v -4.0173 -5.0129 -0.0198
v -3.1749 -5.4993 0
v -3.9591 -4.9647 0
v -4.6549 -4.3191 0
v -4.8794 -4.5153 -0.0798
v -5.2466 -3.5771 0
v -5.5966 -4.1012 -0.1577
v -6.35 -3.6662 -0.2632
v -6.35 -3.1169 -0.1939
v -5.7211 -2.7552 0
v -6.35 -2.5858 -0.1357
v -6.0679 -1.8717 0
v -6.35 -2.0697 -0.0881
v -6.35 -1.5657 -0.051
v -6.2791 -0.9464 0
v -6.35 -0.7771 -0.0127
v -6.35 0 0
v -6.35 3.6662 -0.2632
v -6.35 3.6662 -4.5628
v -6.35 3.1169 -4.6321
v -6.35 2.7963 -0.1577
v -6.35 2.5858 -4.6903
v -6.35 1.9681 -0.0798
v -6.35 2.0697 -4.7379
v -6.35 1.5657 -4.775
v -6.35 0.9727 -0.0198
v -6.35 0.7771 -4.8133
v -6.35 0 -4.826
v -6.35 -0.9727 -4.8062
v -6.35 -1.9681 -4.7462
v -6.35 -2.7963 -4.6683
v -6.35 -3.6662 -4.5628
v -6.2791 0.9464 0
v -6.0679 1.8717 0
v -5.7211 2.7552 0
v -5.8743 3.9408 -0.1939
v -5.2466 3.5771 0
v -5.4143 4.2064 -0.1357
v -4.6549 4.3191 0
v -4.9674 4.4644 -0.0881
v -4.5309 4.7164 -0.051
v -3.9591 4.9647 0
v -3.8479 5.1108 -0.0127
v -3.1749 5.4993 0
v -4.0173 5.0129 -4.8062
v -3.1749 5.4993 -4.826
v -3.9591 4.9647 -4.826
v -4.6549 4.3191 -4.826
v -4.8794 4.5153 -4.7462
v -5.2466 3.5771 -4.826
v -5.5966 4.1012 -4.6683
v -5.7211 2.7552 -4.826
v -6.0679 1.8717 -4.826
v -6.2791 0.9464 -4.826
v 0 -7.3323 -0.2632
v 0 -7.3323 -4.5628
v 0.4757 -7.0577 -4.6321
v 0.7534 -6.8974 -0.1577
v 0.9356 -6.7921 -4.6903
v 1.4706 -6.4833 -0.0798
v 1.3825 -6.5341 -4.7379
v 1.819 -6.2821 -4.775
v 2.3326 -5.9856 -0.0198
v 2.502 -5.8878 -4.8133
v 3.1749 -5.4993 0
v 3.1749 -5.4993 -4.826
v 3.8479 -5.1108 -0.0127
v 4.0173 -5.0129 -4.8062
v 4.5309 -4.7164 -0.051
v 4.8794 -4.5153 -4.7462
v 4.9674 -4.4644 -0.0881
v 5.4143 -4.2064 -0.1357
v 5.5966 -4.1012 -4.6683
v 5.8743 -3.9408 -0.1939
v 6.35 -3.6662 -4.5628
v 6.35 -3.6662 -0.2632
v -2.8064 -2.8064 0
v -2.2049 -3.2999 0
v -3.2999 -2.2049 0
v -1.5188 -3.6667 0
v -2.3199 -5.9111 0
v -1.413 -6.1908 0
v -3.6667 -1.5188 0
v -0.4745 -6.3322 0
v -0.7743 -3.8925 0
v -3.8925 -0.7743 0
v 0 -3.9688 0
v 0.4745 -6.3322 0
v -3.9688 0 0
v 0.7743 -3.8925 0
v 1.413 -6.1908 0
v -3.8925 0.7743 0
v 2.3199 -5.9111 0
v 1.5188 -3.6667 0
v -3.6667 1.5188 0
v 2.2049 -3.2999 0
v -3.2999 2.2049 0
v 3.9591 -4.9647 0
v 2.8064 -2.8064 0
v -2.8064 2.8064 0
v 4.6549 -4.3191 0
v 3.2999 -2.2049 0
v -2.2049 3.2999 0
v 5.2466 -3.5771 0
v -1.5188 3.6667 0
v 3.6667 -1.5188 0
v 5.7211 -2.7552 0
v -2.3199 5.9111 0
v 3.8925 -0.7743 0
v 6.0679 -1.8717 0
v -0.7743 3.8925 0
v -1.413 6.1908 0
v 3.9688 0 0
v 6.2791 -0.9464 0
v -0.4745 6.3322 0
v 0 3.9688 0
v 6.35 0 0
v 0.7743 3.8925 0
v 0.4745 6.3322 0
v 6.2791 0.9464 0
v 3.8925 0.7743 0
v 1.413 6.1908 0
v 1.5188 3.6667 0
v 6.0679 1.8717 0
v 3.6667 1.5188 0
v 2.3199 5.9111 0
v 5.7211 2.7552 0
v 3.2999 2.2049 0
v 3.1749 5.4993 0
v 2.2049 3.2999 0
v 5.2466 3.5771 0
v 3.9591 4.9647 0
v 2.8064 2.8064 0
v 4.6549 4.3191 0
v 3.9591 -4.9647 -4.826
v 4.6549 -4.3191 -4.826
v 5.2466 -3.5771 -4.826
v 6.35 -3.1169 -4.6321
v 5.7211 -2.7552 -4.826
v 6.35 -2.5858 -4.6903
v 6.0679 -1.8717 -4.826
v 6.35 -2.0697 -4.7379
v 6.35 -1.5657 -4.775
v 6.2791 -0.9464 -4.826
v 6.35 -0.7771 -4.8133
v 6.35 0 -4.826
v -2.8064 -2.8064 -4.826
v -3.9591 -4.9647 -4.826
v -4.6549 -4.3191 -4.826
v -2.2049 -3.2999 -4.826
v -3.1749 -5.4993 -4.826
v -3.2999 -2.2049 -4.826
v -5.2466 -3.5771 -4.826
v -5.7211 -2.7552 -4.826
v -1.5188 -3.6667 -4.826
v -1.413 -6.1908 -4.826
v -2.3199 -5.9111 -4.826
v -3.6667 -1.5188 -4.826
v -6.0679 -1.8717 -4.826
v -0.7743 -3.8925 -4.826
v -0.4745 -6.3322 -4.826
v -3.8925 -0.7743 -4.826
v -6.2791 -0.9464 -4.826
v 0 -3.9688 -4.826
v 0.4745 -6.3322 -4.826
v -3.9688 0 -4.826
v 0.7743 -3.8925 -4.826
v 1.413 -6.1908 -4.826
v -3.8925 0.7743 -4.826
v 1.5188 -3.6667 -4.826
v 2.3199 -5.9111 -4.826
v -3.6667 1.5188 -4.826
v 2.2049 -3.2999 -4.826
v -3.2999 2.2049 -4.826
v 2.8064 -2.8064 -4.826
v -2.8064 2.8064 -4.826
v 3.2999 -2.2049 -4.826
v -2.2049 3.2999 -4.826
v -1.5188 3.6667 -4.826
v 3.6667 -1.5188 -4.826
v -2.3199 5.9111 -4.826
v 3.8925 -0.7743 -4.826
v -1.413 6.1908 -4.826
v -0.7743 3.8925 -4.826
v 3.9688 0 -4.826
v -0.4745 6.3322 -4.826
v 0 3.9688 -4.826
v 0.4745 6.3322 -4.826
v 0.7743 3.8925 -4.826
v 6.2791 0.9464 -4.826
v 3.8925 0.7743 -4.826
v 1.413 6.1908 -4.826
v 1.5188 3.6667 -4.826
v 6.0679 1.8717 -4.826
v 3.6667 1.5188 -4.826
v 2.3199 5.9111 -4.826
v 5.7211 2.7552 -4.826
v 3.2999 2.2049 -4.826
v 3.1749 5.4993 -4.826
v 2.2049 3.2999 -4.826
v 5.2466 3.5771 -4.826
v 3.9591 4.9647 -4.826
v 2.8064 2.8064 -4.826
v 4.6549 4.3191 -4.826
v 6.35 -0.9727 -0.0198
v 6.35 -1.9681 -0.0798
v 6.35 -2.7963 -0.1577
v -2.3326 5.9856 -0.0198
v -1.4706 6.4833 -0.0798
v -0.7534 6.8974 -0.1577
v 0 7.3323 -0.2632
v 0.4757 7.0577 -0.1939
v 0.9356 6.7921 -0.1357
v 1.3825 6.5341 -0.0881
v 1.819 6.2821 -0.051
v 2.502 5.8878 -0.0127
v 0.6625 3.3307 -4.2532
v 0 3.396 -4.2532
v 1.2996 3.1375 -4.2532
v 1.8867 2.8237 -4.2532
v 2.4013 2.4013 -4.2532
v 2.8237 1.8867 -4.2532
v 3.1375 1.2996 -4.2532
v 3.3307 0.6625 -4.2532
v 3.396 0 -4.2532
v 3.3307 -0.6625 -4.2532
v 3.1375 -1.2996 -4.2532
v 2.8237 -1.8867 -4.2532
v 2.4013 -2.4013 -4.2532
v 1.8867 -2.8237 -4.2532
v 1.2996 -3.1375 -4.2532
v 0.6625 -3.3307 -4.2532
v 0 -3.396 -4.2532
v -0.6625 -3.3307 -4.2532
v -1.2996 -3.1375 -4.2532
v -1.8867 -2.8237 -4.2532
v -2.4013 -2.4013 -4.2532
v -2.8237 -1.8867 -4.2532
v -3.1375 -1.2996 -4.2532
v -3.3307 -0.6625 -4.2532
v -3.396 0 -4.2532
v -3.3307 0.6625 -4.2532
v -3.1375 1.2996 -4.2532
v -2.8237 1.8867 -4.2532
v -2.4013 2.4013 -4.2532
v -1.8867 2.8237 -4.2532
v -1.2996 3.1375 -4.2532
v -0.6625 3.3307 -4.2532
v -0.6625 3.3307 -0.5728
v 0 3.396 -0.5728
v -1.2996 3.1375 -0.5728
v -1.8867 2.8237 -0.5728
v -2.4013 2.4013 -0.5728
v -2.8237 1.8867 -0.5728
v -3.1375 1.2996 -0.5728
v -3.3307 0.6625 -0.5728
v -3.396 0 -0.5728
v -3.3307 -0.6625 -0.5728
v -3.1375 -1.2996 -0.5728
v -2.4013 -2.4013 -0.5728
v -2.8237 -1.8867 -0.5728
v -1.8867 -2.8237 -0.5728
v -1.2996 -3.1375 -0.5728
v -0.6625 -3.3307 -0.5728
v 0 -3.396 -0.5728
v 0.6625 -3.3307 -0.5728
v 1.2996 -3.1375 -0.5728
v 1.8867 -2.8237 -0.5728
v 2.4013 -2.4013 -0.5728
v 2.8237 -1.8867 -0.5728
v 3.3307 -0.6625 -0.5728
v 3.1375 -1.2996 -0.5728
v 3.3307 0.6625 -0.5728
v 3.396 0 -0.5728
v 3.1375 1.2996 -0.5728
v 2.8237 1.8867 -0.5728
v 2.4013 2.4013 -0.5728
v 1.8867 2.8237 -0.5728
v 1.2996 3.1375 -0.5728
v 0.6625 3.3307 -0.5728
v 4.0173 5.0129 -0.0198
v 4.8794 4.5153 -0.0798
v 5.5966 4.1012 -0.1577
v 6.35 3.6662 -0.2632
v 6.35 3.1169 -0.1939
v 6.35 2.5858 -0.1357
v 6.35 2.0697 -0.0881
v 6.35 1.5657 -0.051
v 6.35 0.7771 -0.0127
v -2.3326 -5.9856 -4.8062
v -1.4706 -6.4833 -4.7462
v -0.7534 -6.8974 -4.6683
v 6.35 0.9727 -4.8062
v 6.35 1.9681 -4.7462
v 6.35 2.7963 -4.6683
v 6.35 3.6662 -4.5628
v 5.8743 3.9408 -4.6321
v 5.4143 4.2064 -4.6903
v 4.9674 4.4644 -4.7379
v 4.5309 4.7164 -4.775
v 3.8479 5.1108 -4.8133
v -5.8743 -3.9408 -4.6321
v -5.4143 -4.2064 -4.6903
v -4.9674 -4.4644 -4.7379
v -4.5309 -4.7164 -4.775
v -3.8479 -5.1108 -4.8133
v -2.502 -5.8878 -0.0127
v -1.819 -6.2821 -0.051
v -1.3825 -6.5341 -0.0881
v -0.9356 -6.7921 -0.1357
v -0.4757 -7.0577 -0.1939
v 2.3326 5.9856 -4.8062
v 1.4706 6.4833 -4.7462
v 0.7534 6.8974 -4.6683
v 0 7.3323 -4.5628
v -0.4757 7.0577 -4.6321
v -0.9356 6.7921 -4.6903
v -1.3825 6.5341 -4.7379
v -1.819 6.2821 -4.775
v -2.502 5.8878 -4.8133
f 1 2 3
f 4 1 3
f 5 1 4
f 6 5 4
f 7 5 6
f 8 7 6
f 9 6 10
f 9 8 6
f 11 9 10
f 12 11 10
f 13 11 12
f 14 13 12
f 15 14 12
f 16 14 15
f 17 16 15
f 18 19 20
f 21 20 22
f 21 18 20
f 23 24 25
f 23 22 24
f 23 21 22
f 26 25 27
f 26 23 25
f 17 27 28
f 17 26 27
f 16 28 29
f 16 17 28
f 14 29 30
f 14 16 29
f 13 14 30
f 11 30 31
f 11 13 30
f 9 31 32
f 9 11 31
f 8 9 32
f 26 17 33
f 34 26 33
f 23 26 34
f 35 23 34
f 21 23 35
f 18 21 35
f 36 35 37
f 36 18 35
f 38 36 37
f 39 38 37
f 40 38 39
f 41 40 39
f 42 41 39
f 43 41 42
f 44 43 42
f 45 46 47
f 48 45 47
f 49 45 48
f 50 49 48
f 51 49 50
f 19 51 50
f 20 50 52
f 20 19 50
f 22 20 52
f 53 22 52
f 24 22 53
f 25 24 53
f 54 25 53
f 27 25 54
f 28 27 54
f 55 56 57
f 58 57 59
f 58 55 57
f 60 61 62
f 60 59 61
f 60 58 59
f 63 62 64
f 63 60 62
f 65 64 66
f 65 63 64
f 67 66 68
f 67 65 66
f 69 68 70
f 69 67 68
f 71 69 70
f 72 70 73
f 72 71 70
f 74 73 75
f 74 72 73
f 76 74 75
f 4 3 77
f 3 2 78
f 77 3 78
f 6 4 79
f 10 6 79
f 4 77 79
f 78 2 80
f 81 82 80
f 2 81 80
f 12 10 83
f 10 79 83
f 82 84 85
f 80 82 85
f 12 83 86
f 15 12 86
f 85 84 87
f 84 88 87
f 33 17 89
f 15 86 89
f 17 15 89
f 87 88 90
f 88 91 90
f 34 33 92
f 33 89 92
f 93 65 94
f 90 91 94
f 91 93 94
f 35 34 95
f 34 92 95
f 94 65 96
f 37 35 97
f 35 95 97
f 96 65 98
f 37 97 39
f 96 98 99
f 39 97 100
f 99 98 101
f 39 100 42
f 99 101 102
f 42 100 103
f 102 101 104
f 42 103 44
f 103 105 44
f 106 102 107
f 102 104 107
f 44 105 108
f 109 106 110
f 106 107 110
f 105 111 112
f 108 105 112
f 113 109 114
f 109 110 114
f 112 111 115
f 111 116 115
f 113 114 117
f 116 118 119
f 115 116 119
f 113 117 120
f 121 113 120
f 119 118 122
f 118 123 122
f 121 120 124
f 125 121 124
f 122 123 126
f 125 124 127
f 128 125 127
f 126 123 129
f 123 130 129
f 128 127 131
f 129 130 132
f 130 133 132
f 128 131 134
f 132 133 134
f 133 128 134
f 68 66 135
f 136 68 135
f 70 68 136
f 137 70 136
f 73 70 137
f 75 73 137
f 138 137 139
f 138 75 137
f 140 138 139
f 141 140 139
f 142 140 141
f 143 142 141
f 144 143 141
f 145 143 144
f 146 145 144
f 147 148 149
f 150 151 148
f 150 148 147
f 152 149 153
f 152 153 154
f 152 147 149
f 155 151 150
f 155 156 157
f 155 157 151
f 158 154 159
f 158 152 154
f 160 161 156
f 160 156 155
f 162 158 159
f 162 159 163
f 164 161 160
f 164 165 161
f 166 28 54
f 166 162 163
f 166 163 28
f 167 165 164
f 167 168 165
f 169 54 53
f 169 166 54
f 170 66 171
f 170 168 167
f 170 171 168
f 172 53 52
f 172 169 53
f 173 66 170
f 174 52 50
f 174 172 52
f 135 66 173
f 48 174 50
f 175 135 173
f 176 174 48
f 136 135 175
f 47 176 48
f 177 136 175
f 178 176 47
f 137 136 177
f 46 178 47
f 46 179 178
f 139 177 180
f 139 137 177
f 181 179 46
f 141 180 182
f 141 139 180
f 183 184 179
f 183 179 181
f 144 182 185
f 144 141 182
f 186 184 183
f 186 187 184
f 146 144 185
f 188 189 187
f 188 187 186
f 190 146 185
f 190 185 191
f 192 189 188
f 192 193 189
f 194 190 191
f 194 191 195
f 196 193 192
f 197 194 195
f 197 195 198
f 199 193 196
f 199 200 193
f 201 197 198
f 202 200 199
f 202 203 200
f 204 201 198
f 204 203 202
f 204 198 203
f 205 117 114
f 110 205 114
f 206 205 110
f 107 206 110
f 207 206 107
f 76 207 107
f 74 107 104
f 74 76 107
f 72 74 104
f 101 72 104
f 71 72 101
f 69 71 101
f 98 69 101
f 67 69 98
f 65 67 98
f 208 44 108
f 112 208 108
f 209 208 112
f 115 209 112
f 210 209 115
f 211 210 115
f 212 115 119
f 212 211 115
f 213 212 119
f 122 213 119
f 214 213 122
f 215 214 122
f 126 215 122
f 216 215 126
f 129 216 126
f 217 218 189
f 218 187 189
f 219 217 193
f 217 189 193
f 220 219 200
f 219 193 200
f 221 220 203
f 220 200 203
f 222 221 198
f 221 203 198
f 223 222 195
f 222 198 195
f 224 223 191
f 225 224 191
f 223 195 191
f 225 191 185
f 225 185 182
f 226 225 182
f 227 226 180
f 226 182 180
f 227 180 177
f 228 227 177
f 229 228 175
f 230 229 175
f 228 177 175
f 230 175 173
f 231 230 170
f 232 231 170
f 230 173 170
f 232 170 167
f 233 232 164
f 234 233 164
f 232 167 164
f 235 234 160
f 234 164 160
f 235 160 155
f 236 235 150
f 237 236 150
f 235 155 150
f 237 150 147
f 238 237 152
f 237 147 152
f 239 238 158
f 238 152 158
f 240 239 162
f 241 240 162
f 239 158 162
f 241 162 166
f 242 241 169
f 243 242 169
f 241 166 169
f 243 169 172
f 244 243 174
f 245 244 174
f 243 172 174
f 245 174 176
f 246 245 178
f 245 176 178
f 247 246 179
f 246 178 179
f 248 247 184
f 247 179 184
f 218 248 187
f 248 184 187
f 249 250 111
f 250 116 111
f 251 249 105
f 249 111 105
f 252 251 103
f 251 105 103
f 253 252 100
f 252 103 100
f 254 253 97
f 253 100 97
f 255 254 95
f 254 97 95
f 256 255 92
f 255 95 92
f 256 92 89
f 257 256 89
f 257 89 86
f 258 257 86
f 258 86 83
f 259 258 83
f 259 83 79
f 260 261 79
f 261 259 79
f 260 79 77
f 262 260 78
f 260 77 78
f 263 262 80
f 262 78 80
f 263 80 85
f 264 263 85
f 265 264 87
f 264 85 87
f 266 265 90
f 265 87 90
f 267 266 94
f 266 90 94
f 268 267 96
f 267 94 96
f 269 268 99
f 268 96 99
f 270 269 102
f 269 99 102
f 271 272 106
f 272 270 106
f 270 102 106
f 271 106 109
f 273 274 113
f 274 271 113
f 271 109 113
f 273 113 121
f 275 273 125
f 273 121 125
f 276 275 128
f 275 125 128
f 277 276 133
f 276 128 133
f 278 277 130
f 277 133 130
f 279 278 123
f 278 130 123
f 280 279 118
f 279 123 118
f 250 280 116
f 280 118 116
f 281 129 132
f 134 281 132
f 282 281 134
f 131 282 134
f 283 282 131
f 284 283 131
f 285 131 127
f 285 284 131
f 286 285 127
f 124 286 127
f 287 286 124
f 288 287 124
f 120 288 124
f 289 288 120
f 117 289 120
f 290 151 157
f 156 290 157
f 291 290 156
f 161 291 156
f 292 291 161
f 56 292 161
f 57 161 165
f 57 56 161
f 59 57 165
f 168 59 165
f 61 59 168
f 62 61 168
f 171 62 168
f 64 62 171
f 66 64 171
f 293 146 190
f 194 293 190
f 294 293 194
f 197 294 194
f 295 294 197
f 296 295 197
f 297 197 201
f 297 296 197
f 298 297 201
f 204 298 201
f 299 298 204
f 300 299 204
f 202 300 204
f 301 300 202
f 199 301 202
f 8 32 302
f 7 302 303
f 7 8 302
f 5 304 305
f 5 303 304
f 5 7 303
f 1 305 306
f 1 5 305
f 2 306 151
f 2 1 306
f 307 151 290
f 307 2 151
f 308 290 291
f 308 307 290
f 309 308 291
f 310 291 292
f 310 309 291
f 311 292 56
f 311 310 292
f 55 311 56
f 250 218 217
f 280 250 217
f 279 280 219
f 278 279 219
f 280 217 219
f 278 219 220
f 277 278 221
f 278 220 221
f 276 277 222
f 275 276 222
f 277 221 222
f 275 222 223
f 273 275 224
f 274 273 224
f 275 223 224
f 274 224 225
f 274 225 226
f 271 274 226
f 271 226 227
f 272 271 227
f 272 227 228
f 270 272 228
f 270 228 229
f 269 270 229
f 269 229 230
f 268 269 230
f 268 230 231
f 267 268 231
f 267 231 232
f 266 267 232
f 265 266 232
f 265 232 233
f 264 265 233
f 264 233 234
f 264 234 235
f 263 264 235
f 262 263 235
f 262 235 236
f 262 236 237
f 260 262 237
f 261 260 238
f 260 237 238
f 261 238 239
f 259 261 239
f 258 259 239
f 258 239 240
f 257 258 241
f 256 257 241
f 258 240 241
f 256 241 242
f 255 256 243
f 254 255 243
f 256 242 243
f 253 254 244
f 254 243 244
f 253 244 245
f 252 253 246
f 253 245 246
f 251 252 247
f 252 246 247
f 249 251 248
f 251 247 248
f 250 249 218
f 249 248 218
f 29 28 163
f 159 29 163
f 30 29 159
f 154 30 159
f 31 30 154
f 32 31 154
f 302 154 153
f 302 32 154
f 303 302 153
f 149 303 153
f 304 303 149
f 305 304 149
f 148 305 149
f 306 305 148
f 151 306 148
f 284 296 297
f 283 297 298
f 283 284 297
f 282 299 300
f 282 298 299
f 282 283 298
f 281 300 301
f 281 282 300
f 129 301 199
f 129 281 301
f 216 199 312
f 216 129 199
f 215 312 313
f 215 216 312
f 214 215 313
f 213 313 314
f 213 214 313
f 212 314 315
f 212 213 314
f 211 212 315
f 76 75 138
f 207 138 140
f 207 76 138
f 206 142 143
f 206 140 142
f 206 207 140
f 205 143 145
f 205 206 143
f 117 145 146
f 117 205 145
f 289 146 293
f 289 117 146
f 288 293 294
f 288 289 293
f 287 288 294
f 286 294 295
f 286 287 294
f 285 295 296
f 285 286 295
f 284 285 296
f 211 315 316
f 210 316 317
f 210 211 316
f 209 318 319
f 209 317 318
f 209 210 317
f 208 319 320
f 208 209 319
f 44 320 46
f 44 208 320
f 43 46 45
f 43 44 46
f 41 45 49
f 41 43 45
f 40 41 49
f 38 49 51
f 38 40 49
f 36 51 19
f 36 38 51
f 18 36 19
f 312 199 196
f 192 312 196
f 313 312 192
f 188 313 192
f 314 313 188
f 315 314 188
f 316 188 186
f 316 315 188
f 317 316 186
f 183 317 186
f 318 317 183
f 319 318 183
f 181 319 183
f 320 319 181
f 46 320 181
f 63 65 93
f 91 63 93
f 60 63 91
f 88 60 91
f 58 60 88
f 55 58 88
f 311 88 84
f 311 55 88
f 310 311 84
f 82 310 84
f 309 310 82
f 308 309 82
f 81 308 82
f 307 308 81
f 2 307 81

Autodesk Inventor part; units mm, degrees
sketch "Sketch_8" plane through (0, 0, 0) normal (1, 0, 0) x (0, 1, 0)
  line L0 (0, -4.826) -> (0, 0)
  line L1 (0, 0) -> (6.35, 0)
  line L2 (6.35, 0) -> (7.62, -0.3403)
  line L3 (7.62, -0.3403) -> (7.62, -4.4857)
  line L4 (7.62, -4.4857) -> (6.35, -4.826)
  line L5 (6.35, -4.826) -> (0, -4.826)
  line L6 (0, -4.826) -> (0, 0)
sketch "Sketch_10" plane through (0, 0, 0) normal (0, 0, 1) x (1, 0, 0)
  line L0 (-12.7, -12.7) -> (12.7, -12.7)
  line L1 (12.7, -12.7) -> (12.7, 12.7)
  line L2 (12.7, 12.7) -> (-12.7, 12.7)
  line L3 (-12.7, 12.7) -> (-12.7, -12.7)
  line L4 (-6.35, -3.6662) -> (0, -7.3323)
  line L5 (0, -7.3323) -> (6.35, -3.6662)
  line L6 (6.35, -3.6662) -> (6.35, 3.6662)
  line L7 (6.35, 3.6662) -> (0, 7.3323)
  line L8 (0, 7.3323) -> (-6.35, 3.6662)
  line L9 (-6.35, 3.6662) -> (-6.35, -3.6662)
revolve "Revolution1" add sketch "Sketch_8" angle 360 about axis through (0, 0, -4.826) along (0, 0, -1)
extrude "Extrusion1" cut sketch "Sketch_10" against normal blind 4.826
sketch "Sketch_11" plane through (0, 0, 0) normal (1, 0, 0) x (0, 1, 0)
  line L0 (0, -4.826) -> (0, 0)
  line L1 (0, 0) -> (3.9688, 0)
  line L2 (3.9688, 0) -> (3.396, -0.5728)
  line L3 (3.396, -0.5728) -> (3.396, -4.2532)
  line L4 (3.396, -4.2532) -> (3.9688, -4.826)
  line L5 (3.9688, -4.826) -> (0, -4.826)
  line L6 (0, -4.826) -> (0, 0)
revolve "Revolution2" cut sketch "Sketch_11" angle 360 about axis through (0, 0, -4.826) along (0, 0, -1)
thread "Thread1" size "5/16-24 UNF" class "2B" standard "ANSI Unified Screw Threads" full length
ref_plane "NUT_XY" through (0, 0, 0) normal (0, 0, 1) x (1, 0, 0)
ref_plane "NUT_YZ" through (0, 0, 0) normal (1, 0, 0) x (0, 1, 0)
ref_plane "NUT_ZX" through (0, 0, 0) normal (0, 1, 0) x (0, 0, 1)
ref_plane "a1_XY" through (-6.35, 6.35, 0) normal (0, 0, 1) x (1, 0, 0)
ref_plane "a1_YZ" through (-6.35, 6.35, 0) normal (1, 0, 0) x (0, 1, 0)
ref_plane "a1_ZX" through (-6.35, 6.35, 0) normal (0, 1, 0) x (0, 0, 1)
ref_plane "a2_XY" through (6.35, 6.35, 0) normal (0, 0, 1) x (1, 0, 0)
ref_plane "a2_YZ" through (6.35, 6.35, 0) normal (1, 0, 0) x (0, 1, 0)
ref_plane "a2_ZX" through (6.35, 6.35, 0) normal (0, 1, 0) x (0, 0, 1)
ref_plane "b1_XY" through (0, 6.35, 0) normal (1, 0, 0) x (0, 0, -1)
ref_plane "b1_YZ" through (0, 6.35, 0) normal (0, 0, -1) x (0, 1, 0)
ref_plane "b1_ZX" through (0, 6.35, 0) normal (0, 1, 0) x (1, 0, 0)
ref_plane "b2_XY" through (0, 6.35, -4.826) normal (1, 0, 0) x (0, 0, -1)
ref_plane "b2_YZ" through (0, 6.35, -4.826) normal (0, 0, -1) x (0, 1, 0)
ref_plane "b2_ZX" through (0, 6.35, -4.826) normal (0, 1, 0) x (1, 0, 0)
ref_plane "e_XY" through (0, 0, -4.826) normal (1, 0, 0) x (0, 0, -1)
ref_plane "e_YZ" through (0, 0, -4.826) normal (0, 0, -1) x (0, 1, 0)
ref_plane "e_ZX" through (0, 0, -4.826) normal (0, 1, 0) x (1, 0, 0)
ref_plane "ol1_XY" through (0, 0, -6.35) normal (0, 1, 0) x (1, 0, 0)
ref_plane "ol1_YZ" through (0, 0, -6.35) normal (1, 0, 0) x (0, 0, -1)
ref_plane "ol1_ZX" through (0, 0, -6.35) normal (0, 0, -1) x (0, 1, 0)
ref_plane "ol2_XY" through (4.826, 0, -6.35) normal (0, 1, 0) x (1, 0, 0)
ref_plane "ol2_YZ" through (4.826, 0, -6.35) normal (1, 0, 0) x (0, 0, -1)
ref_plane "ol2_ZX" through (4.826, 0, -6.35) normal (0, 0, -1) x (0, 1, 0)
ref_plane "th1_XY" through (0, 3.9688, -4.826) normal (1, 0, 0) x (0, 0, -1)
ref_plane "th1_YZ" through (0, 3.9688, -4.826) normal (0, 0, -1) x (0, 1, 0)
ref_plane "th1_ZX" through (0, 3.9688, -4.826) normal (0, 1, 0) x (1, 0, 0)
ref_plane "th2_XY" through (0, -3.9688, -4.826) normal (1, 0, 0) x (0, 0, -1)
ref_plane "th2_YZ" through (0, -3.9688, -4.826) normal (0, 0, -1) x (0, 1, 0)
ref_plane "th2_ZX" through (0, -3.9688, -4.826) normal (0, 1, 0) x (1, 0, 0)
properties part number "D-746"
